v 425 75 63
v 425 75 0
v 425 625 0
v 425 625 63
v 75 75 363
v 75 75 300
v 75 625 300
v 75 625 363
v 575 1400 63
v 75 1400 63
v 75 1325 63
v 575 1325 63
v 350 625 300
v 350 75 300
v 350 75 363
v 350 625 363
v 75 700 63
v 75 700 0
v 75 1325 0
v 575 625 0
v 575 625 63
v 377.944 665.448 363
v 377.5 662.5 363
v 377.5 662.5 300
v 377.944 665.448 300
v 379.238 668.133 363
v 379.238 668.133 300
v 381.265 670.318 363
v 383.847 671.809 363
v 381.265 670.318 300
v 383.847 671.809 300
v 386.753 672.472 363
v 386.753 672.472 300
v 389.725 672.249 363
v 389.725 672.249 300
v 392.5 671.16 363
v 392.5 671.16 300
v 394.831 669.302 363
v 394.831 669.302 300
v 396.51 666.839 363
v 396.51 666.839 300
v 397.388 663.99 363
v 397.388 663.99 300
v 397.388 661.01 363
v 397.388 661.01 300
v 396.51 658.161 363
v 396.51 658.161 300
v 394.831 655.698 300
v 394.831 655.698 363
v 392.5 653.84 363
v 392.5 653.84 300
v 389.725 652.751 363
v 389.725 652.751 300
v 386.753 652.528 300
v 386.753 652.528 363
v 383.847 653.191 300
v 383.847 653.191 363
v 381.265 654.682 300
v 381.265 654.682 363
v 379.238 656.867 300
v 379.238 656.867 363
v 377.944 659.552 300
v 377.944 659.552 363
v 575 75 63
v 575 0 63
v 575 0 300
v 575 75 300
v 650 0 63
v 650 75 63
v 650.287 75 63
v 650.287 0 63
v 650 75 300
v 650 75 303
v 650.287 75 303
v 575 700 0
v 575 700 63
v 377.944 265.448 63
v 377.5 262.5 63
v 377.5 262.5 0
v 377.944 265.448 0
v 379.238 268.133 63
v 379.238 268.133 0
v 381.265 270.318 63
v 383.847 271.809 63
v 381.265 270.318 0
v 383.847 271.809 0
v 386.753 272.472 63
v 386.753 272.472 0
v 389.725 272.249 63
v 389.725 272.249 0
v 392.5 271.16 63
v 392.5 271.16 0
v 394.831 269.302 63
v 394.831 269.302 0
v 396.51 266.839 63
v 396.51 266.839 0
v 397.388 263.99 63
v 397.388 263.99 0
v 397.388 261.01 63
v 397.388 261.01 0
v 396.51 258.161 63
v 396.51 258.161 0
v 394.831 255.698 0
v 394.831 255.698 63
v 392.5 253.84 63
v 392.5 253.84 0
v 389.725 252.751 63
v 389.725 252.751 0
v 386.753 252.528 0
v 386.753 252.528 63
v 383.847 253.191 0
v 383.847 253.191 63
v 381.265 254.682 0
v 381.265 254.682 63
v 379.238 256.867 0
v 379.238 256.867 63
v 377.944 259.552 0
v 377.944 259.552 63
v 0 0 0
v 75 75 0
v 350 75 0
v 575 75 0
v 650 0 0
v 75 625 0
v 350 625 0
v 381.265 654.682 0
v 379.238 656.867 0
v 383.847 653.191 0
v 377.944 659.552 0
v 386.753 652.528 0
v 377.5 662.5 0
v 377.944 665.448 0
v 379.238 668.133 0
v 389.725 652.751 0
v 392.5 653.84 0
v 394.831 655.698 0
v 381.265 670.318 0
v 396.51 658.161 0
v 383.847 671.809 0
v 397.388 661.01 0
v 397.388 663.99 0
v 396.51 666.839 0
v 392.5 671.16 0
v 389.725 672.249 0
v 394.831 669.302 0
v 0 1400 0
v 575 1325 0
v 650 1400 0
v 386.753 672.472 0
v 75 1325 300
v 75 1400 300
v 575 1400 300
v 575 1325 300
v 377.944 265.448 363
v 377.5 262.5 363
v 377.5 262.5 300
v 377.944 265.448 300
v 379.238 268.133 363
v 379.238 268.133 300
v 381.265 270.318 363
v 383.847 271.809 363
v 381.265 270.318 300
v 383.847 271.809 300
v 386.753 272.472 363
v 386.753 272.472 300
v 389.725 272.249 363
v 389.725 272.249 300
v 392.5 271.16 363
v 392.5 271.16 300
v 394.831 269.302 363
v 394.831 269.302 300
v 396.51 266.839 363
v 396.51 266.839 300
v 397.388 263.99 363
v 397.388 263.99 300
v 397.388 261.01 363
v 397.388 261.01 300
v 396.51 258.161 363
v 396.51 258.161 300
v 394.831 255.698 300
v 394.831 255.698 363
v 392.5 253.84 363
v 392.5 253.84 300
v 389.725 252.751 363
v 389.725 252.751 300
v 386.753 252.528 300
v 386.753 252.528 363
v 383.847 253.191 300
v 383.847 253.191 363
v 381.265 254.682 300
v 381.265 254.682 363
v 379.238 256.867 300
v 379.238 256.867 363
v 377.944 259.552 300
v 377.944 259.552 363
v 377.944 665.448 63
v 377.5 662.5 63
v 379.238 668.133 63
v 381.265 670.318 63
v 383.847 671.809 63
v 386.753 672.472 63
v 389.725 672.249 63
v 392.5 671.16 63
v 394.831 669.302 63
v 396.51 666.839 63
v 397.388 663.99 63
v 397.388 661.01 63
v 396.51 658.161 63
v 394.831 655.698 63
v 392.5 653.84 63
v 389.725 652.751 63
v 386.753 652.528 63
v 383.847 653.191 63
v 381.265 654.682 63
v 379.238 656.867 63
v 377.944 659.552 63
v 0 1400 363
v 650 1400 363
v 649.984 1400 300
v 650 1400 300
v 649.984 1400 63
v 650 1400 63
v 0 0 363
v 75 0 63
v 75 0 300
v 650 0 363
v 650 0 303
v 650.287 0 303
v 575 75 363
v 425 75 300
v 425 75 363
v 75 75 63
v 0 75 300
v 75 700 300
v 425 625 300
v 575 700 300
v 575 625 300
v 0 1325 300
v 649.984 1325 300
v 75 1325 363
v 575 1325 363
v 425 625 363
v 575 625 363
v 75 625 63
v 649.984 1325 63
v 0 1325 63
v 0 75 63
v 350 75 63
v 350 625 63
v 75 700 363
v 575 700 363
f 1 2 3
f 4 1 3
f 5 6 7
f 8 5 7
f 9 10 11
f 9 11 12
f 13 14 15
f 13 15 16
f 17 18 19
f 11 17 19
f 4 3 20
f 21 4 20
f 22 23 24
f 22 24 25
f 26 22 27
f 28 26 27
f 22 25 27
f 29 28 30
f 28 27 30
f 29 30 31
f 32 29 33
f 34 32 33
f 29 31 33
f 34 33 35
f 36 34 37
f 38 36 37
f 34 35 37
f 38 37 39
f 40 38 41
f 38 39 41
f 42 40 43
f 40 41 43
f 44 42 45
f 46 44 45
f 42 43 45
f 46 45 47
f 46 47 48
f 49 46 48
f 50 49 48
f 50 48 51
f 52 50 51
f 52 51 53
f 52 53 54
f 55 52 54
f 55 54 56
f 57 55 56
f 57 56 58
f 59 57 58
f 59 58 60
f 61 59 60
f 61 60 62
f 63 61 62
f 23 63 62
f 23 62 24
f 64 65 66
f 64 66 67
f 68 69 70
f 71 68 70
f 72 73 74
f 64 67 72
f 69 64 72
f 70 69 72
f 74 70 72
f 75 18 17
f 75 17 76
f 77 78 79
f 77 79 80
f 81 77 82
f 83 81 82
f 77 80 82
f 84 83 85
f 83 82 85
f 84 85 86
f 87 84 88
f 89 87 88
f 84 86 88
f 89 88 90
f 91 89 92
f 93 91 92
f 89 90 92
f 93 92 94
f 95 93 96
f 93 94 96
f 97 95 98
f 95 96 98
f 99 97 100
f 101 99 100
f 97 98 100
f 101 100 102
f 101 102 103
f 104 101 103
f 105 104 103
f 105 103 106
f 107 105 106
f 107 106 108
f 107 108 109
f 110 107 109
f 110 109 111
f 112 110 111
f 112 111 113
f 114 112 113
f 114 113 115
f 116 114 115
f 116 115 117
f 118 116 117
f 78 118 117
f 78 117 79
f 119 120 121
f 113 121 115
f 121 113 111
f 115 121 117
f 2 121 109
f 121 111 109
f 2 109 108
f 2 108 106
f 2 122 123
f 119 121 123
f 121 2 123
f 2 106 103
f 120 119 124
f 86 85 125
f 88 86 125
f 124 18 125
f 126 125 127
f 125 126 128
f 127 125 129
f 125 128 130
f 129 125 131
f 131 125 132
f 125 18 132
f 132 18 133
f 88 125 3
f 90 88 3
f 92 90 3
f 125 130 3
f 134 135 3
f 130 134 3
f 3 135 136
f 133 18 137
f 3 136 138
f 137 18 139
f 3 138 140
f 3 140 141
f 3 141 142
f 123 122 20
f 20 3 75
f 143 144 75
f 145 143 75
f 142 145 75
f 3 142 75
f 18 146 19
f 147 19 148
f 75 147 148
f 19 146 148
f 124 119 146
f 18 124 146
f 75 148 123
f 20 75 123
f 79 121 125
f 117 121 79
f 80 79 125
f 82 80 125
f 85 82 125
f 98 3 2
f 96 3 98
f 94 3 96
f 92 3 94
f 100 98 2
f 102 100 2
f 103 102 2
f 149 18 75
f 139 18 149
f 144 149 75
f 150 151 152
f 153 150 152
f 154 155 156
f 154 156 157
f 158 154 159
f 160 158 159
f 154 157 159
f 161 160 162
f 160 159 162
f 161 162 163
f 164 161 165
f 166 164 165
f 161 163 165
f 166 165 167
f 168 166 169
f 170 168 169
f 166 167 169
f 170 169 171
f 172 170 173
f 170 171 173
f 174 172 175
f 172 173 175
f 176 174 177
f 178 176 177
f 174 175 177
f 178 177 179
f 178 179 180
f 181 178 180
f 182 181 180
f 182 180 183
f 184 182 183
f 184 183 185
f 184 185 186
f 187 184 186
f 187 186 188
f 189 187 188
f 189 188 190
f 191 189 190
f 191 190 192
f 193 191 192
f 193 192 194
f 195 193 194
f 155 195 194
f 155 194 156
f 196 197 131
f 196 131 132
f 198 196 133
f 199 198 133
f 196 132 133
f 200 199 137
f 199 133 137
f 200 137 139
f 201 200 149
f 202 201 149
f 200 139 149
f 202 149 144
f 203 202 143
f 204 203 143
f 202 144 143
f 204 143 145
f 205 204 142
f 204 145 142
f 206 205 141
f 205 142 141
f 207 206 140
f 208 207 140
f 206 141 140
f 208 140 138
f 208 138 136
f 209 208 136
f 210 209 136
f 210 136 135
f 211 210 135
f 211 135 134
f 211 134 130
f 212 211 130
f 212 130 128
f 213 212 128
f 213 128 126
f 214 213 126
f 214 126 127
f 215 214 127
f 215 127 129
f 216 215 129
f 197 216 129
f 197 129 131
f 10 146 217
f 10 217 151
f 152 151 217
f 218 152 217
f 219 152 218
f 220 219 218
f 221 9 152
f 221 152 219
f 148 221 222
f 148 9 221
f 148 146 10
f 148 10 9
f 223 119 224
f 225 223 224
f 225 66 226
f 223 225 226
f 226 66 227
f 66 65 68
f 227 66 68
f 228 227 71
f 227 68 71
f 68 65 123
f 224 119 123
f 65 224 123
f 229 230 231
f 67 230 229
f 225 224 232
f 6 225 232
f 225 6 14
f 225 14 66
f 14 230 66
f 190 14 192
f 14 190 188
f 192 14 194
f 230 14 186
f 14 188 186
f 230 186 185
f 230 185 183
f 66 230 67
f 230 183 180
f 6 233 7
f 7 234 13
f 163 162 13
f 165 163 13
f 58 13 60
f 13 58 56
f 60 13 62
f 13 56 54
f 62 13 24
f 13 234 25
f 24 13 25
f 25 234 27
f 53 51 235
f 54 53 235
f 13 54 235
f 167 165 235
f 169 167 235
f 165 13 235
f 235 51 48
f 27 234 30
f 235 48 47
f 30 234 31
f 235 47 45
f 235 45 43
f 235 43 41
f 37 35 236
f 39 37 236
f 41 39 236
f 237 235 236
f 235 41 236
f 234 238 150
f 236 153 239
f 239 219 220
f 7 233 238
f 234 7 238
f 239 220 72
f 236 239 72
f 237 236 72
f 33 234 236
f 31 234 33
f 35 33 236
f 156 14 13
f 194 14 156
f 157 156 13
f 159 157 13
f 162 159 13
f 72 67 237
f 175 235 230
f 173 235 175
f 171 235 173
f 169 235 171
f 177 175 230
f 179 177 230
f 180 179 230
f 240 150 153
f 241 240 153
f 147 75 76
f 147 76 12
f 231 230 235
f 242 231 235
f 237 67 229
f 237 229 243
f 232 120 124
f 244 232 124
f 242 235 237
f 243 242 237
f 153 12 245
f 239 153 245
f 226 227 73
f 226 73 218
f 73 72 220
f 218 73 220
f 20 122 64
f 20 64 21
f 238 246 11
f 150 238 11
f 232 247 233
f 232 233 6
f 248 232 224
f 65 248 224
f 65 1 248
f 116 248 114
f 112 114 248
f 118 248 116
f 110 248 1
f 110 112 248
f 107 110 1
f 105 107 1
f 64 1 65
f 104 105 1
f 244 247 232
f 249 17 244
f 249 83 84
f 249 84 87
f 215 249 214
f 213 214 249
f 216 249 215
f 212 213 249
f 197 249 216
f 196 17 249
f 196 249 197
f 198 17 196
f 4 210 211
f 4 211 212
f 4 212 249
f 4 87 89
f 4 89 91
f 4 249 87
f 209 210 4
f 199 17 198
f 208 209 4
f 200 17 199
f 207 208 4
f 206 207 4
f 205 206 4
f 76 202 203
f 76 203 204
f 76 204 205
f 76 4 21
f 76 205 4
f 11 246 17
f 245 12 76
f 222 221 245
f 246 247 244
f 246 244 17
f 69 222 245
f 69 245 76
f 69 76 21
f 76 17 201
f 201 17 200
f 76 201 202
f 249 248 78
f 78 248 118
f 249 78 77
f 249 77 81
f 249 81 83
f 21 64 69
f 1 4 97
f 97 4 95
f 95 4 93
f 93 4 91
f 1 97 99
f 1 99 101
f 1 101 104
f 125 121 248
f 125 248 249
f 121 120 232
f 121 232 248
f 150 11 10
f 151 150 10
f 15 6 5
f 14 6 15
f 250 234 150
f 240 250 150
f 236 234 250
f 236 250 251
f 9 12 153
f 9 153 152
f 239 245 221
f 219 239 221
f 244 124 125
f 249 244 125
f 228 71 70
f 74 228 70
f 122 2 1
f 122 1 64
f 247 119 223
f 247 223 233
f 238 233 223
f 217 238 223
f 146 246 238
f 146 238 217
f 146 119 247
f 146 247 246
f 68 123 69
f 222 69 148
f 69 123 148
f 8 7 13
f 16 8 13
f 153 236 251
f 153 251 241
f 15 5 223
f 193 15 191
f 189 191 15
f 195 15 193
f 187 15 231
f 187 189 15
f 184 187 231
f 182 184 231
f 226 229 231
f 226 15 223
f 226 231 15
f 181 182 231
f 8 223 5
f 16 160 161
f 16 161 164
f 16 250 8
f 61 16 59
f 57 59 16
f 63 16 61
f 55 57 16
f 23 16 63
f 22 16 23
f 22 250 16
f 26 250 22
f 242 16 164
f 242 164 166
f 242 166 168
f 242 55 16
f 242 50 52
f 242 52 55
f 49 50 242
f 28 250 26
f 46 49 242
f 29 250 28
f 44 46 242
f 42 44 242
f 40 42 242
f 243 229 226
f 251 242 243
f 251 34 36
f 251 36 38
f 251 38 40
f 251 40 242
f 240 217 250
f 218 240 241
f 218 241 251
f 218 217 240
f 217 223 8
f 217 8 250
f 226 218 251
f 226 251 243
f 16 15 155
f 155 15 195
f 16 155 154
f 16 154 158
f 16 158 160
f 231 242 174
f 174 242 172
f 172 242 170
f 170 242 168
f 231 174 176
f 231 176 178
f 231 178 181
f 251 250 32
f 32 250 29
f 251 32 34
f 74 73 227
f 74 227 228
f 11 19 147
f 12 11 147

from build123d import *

# Parameters (mm, degrees)
ESQUISSE1_W                = 650
ESQUISSE1_H                = 1400
ESQUISSE1_W_2              = 275
ESQUISSE1_H_2              = 550
ESQUISSE1_W_3              = 150
ESQUISSE1_W_4              = 500
ESQUISSE1_H_3              = 625
BOSS_EXTRU_1_DEPTH         = 63
R_P_TITION_LIN_AIRE1_COUNT = 2
R_P_TITION_LIN_AIRE1_PITCH = 300
ESQUISSE2_W                = 75
ESQUISSE2_H                = 75
ESQUISSE2_W_2              = 75.286628514
ESQUISSE2_W_3              = 74.984214748
BOSS_EXTRU_2_DEPTH         = 240
ESQUISSE15_R               = 10
ENL_V_MAT_EXTRU_4_DEPTH    = 1586.76218243


with BuildPart() as part:
    # Esquisse1 → Boss.-Extru.1 (new body)
    with BuildSketch(Plane.XY):
        with Locations((325, 700)):
            Rectangle(ESQUISSE1_W, ESQUISSE1_H)
        with Locations((212.5, 350)):
            Rectangle(ESQUISSE1_W_2, ESQUISSE1_H_2, mode=Mode.SUBTRACT)
        with Locations((500, 350)):
            Rectangle(ESQUISSE1_W_3, ESQUISSE1_H_2, mode=Mode.SUBTRACT)
        with Locations((325, 1012.5)):
            Rectangle(ESQUISSE1_W_4, ESQUISSE1_H_3, mode=Mode.SUBTRACT)
    extrude(amount=BOSS_EXTRU_1_DEPTH)


with BuildPart() as r_p_tition_lin_aire1_1:
    # Répétition linéaire1: pattern copy
    add(part.part.moved(Location(Vector(0, 0, 1) * (1 * R_P_TITION_LIN_AIRE1_PITCH))))


with BuildPart() as part_1:
    add(part.part)

    add(r_p_tition_lin_aire1_1.part)  # Boss.-Extru.2 merges Répétition linéaire1_1
    # Esquisse2 → Boss.-Extru.2 (add)
    with BuildSketch(Plane.XY.offset(63)):
        with Locations((37.5, 37.5)):
            Rectangle(ESQUISSE2_W, ESQUISSE2_H)
        with Locations((612.643314257, 37.5)):
            Rectangle(ESQUISSE2_W_2, ESQUISSE2_H)
        with Locations((612.492107374, 1362.5)):
            Rectangle(ESQUISSE2_W_3, ESQUISSE2_H)
        with Locations((37.5, 1362.5)):
            Rectangle(ESQUISSE2_W, ESQUISSE2_H)
    extrude(amount=BOSS_EXTRU_2_DEPTH)

    # Esquisse15 → Enlèv. mat.-Extru.4 (cut, through all)
    with BuildSketch(Plane(origin=(0, 0, 0), x_dir=(-1, 0, 0), z_dir=(0, 0, -1))):
        with Locations((-387.5, 662.5)):
            Circle(ESQUISSE15_R)
        with Locations((-387.5, 262.5)):
            Circle(ESQUISSE15_R)
    extrude(amount=-ENL_V_MAT_EXTRU_4_DEPTH, mode=Mode.SUBTRACT)


solid = part_1.part
